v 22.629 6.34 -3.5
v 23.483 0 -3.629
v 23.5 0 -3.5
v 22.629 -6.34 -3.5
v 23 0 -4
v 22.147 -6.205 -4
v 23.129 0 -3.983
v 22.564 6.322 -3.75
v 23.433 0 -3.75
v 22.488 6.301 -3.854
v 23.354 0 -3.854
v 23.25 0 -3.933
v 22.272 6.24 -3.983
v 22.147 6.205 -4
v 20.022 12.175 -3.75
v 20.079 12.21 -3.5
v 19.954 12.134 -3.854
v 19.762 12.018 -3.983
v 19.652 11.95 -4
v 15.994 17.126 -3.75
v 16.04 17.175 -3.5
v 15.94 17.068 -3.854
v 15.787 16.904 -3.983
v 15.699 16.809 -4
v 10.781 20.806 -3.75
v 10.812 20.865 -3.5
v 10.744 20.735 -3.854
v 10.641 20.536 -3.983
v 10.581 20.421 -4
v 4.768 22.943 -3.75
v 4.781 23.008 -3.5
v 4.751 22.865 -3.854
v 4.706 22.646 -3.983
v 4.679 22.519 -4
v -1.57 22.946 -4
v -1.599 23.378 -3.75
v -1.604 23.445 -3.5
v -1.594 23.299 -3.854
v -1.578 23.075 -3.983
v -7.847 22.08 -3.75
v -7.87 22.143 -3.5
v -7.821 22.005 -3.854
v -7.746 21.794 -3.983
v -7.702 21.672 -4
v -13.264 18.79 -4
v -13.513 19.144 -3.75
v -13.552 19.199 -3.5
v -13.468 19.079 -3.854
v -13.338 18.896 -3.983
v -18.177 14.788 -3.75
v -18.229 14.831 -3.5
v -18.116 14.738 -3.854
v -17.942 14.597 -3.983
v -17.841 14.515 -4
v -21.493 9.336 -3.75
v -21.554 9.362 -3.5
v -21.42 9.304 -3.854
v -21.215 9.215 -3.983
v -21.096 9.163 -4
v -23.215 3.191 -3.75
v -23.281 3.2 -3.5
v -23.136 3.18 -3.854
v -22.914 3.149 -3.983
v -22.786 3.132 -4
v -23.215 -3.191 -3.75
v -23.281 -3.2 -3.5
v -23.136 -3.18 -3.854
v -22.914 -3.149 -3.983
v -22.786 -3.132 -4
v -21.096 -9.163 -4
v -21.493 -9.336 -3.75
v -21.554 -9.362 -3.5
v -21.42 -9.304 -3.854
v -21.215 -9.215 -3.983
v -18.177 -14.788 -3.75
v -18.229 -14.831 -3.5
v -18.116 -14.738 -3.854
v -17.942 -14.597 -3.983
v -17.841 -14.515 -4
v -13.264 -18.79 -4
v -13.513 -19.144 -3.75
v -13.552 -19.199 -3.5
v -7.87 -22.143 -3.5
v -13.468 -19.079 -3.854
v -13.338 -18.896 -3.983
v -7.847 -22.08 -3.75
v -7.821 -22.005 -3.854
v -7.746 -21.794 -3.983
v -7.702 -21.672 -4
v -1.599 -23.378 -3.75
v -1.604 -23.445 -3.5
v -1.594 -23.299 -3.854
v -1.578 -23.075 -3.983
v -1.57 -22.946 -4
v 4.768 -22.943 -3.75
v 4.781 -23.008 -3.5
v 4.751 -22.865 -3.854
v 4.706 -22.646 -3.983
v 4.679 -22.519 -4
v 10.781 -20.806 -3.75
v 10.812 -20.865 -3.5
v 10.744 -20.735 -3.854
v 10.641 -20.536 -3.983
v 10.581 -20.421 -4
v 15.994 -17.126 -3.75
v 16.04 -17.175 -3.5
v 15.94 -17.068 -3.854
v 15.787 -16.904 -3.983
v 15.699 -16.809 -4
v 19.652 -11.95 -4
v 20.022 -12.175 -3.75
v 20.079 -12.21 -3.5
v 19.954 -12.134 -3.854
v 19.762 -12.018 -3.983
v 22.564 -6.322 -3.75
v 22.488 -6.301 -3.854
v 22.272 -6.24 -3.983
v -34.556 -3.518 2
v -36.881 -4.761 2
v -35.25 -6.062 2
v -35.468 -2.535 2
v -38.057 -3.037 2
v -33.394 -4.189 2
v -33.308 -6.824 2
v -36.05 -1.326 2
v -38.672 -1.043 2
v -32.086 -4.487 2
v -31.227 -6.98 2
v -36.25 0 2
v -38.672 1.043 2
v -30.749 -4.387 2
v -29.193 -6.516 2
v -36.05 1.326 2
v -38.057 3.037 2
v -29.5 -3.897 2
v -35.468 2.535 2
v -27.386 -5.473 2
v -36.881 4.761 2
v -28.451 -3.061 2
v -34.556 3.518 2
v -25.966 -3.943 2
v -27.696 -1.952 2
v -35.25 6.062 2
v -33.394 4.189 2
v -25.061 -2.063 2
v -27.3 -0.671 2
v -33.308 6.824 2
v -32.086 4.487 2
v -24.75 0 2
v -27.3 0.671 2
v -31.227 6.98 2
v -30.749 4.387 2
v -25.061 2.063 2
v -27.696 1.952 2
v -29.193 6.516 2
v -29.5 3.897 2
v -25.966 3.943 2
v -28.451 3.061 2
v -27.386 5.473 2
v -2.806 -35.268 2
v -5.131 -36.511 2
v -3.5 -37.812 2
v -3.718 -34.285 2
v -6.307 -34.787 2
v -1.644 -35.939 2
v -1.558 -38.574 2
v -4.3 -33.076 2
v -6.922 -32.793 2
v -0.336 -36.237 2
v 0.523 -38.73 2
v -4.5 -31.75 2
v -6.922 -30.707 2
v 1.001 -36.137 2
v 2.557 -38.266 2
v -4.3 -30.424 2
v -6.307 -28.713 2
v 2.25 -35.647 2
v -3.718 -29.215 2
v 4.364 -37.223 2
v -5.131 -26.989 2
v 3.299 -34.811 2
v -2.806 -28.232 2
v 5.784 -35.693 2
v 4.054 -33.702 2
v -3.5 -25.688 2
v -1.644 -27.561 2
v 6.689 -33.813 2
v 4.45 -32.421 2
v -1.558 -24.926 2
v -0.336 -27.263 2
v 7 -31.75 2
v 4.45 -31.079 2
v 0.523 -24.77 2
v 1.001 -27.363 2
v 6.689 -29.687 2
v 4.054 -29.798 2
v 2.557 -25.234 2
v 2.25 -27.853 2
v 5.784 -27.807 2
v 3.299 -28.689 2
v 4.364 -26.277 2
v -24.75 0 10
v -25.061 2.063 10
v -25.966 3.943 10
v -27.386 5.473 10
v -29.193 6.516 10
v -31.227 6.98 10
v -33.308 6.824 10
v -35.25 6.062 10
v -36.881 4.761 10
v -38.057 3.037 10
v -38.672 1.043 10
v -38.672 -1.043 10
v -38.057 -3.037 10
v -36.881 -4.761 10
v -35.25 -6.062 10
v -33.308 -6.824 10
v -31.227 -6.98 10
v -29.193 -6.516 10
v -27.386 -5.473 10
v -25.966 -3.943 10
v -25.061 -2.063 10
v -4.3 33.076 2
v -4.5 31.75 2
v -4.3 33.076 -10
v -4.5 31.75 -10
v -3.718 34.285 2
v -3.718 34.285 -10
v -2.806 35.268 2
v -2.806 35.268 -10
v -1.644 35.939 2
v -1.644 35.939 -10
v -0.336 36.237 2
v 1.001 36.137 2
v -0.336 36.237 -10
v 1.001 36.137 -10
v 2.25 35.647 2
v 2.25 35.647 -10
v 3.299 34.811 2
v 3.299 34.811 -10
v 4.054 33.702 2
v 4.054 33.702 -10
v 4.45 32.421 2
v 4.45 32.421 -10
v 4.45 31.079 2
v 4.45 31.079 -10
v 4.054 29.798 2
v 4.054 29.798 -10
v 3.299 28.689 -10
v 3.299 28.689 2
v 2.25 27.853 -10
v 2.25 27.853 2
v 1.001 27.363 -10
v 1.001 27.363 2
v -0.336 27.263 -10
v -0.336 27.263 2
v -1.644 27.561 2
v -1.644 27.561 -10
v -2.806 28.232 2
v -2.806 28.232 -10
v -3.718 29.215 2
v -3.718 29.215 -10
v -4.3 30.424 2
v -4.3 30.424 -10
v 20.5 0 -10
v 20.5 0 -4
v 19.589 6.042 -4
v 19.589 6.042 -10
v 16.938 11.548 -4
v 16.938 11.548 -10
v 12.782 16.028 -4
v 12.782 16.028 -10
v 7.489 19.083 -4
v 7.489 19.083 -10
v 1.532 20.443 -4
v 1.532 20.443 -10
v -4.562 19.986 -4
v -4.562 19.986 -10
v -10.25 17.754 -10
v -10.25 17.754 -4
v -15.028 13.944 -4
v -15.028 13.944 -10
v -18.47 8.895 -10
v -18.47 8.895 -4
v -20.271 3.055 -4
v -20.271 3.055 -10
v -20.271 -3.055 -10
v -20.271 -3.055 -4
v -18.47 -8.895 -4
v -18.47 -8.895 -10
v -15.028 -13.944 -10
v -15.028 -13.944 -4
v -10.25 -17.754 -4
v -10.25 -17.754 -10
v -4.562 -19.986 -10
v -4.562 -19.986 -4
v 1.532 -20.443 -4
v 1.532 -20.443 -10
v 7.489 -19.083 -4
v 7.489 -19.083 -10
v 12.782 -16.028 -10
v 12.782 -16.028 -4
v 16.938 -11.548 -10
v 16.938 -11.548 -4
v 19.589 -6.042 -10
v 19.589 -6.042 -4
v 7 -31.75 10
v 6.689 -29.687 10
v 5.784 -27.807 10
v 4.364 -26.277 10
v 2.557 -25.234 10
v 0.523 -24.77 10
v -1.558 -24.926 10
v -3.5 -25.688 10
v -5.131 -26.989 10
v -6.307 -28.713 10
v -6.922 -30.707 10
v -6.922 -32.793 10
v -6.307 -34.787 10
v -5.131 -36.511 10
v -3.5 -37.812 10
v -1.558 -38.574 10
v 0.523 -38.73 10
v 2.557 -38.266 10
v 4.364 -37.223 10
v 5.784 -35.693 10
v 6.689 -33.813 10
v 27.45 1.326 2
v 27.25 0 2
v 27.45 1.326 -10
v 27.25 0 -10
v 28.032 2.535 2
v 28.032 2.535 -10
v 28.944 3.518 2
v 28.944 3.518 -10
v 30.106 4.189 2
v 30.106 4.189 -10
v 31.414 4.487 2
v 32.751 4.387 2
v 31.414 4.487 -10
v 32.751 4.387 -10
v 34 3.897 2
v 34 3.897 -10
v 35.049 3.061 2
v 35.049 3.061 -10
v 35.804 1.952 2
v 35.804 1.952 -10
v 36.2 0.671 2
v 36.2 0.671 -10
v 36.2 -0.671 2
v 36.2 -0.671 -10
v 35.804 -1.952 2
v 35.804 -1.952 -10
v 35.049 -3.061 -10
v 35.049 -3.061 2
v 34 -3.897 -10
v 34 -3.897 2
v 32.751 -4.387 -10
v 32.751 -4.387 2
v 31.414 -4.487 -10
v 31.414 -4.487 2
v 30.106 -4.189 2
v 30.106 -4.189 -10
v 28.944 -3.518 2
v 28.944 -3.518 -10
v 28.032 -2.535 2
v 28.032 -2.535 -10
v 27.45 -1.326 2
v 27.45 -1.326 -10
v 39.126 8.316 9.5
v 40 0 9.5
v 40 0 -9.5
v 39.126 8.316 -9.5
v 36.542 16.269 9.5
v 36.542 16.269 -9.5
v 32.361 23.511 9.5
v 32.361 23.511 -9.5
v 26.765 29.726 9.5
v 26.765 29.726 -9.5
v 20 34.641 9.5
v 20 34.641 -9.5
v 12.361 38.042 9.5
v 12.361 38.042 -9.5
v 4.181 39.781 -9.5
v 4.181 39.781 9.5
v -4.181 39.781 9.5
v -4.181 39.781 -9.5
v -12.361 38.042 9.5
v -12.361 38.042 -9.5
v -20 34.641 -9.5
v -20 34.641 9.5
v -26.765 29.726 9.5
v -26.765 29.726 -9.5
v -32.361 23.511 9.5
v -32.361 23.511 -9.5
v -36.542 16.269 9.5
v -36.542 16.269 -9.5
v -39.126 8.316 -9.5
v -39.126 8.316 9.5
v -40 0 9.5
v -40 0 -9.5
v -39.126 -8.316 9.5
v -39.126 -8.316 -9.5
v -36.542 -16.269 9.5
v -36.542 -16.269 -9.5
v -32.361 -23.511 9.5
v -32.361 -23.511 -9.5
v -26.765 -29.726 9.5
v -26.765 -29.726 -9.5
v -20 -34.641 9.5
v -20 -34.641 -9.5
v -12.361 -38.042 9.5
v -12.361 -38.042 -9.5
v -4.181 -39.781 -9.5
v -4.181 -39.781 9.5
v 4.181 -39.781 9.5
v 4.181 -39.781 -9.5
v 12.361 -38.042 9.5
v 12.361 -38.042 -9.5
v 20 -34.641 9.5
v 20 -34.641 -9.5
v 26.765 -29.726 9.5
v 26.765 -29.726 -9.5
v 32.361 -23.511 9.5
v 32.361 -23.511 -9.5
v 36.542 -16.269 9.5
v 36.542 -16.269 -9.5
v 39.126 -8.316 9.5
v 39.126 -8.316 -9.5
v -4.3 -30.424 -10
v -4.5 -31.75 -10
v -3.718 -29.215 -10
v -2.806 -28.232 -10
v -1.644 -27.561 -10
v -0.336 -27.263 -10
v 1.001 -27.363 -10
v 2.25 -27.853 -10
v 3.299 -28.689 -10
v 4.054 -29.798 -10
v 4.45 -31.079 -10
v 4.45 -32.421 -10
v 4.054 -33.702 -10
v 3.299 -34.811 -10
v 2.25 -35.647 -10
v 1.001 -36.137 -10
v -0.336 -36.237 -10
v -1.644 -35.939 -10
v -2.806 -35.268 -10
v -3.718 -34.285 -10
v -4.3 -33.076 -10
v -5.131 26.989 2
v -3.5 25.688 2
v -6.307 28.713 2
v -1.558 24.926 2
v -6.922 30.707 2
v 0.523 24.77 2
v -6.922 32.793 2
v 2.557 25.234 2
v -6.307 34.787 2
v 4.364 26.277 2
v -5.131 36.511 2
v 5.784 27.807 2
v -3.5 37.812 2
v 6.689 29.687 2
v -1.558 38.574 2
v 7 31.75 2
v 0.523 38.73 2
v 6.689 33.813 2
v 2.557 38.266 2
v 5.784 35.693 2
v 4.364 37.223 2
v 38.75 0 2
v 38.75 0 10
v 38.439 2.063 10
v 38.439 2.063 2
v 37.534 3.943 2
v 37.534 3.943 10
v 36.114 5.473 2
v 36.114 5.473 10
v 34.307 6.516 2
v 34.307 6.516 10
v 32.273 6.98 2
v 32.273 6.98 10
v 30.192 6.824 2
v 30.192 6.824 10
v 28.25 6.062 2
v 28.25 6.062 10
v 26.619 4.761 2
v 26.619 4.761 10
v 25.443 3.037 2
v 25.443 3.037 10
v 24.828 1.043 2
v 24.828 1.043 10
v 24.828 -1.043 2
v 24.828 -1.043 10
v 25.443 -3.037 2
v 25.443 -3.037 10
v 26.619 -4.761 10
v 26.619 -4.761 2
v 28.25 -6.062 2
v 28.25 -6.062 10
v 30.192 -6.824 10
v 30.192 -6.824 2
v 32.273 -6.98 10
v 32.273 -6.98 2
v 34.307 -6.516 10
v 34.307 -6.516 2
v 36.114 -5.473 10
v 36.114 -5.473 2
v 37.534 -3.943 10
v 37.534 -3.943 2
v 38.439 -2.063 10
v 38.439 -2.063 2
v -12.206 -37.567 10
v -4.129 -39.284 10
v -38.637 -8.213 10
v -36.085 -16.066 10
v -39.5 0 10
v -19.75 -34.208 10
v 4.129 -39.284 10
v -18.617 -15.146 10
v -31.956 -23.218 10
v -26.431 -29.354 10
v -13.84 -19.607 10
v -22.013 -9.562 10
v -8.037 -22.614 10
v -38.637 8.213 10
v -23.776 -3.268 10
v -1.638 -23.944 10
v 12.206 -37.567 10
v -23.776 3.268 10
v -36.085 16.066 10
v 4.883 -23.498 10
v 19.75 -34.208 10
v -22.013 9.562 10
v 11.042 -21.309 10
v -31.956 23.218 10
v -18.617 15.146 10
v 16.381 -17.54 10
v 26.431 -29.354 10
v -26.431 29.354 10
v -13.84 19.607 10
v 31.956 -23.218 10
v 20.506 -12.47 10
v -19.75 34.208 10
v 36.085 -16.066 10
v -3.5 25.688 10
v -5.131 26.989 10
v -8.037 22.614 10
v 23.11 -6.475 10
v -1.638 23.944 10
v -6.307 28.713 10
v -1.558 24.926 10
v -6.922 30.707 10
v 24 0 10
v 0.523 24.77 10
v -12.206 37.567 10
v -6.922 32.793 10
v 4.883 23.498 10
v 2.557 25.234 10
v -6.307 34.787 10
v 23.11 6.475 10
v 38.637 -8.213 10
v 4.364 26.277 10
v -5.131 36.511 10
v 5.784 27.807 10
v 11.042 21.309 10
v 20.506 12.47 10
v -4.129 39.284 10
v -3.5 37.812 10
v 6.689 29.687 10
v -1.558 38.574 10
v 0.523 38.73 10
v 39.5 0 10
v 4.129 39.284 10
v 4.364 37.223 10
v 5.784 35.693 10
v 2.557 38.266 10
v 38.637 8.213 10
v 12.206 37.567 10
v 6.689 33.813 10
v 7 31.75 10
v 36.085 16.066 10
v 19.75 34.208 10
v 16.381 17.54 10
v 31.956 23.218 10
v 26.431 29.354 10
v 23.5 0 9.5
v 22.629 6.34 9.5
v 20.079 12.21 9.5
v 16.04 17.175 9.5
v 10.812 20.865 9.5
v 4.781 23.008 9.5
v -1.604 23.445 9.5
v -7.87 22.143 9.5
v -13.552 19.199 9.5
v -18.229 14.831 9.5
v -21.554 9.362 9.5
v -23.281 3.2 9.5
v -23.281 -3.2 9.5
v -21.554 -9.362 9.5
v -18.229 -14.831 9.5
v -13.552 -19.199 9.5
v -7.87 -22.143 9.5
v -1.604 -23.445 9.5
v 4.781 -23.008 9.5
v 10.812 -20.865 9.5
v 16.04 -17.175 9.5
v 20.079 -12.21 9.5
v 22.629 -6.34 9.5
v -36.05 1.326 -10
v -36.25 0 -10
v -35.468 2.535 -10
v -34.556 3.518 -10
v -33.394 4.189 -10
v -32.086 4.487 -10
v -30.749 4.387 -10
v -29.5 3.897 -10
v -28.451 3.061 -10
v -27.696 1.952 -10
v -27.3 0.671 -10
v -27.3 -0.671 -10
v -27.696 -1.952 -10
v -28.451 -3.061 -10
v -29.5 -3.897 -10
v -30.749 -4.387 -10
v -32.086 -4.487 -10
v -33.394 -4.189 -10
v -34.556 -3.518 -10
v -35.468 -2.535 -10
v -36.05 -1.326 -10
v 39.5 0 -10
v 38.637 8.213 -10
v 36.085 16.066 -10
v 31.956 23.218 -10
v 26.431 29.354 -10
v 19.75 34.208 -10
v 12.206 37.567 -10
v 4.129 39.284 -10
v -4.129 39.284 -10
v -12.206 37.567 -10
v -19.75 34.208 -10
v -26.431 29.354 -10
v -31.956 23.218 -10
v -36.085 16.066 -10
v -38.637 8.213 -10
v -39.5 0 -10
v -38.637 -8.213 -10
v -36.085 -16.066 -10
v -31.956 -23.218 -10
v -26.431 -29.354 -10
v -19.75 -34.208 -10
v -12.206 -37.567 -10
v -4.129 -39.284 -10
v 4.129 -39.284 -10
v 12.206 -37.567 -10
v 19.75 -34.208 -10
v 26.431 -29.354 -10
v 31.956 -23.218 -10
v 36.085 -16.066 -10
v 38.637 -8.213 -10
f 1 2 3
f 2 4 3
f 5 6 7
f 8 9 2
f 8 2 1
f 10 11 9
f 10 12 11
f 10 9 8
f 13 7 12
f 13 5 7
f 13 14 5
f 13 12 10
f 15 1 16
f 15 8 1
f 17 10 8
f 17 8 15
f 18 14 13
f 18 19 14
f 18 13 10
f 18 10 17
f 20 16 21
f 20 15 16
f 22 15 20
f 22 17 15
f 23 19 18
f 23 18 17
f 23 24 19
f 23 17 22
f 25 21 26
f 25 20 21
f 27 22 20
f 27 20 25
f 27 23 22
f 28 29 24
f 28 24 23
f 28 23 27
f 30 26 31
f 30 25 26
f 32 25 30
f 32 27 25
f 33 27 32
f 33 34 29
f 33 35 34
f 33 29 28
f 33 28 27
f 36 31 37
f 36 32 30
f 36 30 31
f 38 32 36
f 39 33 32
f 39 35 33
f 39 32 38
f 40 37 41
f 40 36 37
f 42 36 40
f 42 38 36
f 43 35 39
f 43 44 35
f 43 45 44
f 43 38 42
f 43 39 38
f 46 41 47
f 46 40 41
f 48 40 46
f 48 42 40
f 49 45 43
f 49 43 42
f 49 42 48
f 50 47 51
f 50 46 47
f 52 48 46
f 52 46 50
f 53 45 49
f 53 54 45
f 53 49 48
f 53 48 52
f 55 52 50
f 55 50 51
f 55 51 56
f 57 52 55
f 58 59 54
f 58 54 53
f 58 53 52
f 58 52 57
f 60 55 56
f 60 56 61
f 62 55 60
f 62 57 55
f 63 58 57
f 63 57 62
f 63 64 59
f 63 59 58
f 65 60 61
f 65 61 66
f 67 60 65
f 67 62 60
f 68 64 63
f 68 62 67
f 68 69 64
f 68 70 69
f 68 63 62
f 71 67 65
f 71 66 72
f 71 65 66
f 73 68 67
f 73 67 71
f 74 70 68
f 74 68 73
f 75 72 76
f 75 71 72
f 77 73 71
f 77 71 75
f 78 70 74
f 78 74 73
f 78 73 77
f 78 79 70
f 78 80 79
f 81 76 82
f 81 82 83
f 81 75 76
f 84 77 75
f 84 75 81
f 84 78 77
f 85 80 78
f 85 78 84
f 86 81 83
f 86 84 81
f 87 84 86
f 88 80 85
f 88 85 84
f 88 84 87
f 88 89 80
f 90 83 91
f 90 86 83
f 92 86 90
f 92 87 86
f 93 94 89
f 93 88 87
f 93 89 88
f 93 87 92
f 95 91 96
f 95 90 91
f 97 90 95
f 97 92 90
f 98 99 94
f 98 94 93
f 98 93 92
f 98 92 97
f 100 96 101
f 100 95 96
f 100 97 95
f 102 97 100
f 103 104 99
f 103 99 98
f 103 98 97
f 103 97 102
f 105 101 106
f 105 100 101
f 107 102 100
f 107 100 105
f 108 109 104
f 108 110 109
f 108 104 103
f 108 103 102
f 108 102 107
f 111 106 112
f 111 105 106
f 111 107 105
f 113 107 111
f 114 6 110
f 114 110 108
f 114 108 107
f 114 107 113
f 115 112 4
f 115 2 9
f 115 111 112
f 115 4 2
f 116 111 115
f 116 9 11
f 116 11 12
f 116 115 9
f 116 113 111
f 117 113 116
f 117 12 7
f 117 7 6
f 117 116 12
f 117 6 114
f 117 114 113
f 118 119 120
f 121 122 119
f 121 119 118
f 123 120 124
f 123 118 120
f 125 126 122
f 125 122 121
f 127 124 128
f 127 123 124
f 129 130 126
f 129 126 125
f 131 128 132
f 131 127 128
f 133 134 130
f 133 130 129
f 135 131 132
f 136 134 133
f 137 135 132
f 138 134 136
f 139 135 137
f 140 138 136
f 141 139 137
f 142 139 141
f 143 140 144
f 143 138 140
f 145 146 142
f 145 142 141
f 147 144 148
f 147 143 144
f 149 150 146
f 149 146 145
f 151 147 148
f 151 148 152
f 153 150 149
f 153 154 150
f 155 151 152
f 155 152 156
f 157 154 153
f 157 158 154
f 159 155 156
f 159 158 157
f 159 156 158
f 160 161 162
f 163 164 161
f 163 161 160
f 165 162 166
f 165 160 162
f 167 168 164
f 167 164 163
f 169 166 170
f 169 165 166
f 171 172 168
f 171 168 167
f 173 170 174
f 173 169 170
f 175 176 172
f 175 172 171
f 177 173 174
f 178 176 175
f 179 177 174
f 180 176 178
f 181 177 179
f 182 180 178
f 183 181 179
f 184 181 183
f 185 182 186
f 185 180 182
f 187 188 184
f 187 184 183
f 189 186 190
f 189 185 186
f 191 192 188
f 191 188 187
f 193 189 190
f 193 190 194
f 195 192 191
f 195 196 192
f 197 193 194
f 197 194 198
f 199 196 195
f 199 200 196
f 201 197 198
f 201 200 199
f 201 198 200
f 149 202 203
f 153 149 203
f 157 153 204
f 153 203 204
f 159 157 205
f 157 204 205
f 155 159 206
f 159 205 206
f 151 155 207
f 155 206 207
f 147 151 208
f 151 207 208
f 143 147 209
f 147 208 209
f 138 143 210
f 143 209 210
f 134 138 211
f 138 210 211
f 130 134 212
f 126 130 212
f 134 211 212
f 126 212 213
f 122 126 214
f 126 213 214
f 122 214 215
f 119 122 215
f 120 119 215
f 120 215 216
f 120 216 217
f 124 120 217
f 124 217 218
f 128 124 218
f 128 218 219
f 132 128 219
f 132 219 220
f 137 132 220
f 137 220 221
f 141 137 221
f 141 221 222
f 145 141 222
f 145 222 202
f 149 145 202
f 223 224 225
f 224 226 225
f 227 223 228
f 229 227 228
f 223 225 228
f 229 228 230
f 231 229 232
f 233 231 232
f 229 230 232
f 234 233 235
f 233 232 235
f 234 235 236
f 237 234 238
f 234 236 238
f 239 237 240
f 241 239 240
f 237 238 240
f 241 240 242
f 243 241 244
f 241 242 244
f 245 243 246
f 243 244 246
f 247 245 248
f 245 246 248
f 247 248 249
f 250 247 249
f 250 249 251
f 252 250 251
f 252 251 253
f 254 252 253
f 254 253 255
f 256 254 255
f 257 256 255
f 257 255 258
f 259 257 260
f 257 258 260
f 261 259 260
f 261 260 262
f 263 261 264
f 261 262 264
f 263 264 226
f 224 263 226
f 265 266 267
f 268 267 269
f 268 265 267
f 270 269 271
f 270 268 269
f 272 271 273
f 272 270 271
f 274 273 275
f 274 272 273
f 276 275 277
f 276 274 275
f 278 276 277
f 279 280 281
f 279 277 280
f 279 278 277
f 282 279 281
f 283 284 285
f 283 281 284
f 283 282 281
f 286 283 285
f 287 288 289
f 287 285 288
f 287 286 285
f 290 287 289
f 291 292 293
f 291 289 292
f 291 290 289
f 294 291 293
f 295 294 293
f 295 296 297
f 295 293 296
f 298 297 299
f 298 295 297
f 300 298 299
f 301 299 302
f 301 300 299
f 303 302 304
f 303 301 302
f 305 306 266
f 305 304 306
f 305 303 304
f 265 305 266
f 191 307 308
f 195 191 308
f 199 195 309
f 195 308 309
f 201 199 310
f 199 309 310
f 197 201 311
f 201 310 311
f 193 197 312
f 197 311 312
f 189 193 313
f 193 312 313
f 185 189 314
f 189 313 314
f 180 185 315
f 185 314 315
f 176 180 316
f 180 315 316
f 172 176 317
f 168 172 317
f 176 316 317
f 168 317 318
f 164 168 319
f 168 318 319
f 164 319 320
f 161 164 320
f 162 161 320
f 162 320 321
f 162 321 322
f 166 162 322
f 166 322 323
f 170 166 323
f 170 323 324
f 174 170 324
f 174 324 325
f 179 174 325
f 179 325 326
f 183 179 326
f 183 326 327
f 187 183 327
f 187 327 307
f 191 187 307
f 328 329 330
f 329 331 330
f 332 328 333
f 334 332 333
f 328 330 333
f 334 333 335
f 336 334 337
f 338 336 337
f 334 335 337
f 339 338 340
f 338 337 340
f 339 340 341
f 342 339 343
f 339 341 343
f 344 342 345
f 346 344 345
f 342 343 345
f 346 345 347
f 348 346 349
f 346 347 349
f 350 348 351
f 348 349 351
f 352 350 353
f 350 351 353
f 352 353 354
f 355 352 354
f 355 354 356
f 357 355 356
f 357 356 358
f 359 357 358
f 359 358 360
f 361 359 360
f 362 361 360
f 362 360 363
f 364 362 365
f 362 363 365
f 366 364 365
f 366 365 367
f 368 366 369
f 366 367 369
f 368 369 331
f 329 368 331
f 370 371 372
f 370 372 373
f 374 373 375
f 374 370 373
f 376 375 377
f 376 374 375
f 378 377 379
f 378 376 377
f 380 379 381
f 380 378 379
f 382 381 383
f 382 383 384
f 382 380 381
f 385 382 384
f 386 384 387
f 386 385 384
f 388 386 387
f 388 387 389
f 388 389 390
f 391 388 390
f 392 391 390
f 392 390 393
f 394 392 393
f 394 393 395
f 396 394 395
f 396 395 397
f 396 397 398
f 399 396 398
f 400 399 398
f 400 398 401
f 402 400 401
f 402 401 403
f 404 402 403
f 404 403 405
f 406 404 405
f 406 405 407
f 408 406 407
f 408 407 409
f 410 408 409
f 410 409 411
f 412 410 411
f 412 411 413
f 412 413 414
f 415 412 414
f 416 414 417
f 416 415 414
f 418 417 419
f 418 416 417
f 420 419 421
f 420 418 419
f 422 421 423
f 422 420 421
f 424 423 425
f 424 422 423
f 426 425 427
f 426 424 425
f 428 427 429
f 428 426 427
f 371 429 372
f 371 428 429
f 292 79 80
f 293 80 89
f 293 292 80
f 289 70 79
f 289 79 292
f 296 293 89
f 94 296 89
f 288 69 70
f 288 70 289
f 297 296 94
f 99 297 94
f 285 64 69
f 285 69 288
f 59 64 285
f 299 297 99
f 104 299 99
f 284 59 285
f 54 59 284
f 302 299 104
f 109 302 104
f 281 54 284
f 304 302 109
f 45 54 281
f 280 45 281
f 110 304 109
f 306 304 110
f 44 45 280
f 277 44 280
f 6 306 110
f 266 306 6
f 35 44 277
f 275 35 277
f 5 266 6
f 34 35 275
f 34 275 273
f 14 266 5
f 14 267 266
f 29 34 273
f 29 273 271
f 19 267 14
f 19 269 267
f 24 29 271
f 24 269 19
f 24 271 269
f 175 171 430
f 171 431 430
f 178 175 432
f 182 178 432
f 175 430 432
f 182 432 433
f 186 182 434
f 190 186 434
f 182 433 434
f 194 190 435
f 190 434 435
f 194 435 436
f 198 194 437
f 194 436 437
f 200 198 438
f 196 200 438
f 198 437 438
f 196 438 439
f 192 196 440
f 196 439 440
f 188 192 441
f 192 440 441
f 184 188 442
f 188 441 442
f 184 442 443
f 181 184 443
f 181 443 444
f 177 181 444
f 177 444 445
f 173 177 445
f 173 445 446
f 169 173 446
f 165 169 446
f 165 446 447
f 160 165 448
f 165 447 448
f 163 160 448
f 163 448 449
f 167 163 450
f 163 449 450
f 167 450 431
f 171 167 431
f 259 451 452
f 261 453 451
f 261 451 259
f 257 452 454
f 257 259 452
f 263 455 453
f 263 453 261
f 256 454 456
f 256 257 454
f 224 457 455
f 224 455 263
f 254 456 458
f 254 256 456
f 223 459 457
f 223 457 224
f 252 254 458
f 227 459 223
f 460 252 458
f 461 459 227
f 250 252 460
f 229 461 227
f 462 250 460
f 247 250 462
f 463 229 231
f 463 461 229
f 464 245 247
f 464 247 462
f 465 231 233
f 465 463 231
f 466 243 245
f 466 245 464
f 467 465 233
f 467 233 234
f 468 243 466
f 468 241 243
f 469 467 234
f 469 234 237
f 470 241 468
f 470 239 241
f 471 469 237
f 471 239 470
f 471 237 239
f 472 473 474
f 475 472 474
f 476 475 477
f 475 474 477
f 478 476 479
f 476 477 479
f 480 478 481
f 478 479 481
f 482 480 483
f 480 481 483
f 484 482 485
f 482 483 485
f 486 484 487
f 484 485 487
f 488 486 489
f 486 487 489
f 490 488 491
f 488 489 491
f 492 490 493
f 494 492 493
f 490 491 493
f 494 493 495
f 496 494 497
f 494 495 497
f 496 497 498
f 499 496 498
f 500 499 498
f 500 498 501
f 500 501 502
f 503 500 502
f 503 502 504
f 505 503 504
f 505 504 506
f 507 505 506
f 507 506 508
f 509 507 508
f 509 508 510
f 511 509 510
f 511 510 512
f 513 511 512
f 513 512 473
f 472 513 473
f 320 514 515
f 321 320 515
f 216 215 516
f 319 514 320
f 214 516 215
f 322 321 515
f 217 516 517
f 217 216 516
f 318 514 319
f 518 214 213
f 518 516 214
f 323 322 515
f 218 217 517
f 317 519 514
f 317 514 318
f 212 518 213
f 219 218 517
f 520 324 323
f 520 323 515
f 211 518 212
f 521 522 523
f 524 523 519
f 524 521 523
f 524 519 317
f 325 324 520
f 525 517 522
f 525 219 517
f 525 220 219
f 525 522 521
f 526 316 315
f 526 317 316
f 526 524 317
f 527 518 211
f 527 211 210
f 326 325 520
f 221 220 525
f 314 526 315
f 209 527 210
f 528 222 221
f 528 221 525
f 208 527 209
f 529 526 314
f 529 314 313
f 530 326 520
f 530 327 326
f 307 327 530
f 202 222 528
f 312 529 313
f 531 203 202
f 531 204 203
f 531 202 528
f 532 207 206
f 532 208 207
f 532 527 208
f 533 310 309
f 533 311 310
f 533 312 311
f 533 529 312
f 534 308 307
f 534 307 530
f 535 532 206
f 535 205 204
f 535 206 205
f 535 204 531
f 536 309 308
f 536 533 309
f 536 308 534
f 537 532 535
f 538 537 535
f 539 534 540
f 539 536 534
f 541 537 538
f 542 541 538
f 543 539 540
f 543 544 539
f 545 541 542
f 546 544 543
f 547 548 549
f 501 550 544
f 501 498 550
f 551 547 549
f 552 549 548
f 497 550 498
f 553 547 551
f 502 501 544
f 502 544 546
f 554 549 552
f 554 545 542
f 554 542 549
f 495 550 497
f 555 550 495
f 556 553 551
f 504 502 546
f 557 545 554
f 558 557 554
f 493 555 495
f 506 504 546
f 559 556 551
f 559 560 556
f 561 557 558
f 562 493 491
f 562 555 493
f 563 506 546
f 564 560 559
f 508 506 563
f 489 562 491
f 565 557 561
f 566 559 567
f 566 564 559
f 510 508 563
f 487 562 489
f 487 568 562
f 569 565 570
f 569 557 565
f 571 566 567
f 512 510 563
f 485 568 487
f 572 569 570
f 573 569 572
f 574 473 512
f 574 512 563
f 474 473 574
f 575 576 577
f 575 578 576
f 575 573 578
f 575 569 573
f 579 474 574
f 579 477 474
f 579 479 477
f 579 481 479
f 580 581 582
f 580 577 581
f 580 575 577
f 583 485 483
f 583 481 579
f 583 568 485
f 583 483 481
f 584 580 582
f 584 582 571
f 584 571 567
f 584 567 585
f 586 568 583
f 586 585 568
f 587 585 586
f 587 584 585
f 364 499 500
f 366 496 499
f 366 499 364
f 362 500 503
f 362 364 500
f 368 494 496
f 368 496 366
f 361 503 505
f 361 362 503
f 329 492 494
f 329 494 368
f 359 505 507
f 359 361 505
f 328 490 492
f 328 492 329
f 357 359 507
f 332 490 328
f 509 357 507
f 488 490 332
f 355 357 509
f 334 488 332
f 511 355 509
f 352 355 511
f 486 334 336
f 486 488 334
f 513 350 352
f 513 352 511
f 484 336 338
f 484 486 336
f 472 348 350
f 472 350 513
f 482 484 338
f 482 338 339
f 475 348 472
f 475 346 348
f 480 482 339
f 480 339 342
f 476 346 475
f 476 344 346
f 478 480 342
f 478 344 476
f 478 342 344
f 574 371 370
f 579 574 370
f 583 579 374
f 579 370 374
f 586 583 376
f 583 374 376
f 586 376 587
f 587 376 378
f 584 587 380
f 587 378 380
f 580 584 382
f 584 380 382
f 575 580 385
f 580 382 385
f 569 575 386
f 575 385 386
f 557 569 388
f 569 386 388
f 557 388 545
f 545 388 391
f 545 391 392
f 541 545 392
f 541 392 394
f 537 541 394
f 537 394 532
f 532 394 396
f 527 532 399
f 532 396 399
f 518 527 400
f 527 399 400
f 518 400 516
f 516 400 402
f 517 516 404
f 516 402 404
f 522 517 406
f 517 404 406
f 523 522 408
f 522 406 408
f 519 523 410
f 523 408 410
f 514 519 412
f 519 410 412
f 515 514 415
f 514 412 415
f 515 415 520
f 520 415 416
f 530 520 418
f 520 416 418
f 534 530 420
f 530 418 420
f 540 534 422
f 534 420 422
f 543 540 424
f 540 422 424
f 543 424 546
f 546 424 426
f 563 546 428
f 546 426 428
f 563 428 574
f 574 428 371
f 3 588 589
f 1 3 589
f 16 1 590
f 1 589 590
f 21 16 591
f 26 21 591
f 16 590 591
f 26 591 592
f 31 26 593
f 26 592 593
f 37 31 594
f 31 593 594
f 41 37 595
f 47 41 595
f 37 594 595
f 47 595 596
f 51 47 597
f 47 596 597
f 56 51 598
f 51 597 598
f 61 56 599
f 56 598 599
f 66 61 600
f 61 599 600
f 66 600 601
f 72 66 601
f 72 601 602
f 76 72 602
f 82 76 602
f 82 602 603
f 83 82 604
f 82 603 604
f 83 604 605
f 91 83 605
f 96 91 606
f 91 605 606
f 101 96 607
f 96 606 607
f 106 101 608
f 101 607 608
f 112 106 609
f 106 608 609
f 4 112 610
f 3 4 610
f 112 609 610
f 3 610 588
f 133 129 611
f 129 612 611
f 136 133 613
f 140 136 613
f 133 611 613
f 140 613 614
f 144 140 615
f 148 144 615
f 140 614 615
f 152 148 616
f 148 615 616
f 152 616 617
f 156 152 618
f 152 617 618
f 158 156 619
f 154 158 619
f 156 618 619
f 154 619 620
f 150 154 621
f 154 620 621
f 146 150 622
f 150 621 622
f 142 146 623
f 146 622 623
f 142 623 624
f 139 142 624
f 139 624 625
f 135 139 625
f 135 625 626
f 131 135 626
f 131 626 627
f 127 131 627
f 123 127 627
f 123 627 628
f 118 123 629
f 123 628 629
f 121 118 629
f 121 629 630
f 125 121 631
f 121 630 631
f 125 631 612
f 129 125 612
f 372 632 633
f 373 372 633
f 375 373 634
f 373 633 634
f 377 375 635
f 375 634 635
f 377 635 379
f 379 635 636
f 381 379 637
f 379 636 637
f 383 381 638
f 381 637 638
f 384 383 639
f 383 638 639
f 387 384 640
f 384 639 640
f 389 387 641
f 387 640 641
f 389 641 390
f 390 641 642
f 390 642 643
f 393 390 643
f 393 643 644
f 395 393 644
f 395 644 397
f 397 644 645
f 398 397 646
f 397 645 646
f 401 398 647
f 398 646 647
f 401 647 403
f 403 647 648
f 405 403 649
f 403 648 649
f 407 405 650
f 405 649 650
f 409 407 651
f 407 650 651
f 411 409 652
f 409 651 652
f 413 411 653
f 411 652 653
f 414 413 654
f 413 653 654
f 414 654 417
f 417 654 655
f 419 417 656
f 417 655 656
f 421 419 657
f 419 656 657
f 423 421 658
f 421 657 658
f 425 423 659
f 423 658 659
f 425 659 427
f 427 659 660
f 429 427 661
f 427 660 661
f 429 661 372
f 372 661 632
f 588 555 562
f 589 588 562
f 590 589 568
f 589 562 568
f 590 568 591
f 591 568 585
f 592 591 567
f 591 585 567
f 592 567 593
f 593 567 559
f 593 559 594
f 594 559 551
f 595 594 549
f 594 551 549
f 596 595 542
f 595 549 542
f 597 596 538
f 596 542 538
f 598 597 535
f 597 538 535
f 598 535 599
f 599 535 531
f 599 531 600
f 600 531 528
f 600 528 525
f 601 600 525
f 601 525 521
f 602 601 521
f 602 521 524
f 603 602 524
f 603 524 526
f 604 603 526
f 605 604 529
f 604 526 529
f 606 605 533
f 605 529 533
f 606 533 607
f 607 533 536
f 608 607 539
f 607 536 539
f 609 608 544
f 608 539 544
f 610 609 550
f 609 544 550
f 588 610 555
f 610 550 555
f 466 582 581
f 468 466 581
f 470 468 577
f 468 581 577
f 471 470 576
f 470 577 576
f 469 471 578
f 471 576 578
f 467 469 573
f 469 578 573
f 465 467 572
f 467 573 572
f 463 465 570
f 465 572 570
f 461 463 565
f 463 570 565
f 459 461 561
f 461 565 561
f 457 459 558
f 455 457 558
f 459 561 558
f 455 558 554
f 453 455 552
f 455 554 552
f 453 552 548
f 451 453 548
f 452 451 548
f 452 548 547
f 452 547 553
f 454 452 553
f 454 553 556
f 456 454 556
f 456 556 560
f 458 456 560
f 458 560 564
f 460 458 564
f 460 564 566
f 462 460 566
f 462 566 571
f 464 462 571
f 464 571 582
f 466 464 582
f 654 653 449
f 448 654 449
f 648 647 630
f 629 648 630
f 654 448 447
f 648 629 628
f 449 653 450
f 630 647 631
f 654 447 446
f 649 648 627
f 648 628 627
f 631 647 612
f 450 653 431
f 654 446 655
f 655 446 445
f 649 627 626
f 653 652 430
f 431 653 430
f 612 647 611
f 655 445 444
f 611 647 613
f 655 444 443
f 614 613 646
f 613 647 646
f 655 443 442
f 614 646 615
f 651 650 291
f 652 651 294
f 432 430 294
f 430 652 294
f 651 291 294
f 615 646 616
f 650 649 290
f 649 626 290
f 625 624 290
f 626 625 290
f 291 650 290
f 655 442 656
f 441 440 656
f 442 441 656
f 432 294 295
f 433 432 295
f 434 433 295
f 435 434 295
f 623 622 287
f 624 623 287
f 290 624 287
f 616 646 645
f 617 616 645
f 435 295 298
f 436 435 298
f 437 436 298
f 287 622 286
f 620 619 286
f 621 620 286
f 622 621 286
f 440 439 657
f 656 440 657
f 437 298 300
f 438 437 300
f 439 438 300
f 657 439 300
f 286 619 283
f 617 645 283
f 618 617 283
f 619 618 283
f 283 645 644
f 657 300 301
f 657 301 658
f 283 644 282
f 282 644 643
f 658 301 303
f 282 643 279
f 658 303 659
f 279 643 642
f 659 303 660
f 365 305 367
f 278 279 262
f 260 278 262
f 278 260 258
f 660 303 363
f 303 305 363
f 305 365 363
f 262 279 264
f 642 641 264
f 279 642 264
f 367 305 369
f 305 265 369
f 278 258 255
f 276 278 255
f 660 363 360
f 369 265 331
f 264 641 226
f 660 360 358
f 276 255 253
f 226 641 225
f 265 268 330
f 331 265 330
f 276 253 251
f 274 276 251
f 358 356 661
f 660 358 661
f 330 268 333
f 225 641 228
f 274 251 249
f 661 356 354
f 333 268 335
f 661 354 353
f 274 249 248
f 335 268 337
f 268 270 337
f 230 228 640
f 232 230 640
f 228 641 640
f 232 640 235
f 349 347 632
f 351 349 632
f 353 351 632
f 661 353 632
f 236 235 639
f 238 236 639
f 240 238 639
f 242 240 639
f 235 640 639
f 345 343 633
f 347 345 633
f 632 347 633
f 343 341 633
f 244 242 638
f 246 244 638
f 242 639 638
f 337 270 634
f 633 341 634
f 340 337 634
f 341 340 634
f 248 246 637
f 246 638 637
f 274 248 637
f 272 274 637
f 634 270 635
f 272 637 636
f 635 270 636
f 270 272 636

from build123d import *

# Parameters (mm, degrees)
F0_R           = 40
F0_R_2         = 20.5
F1_DEPTH       = 10
F2_R           = 23.5
F3_DEPTH       = 14
F4_R           = 0.5
F5_SIZE        = 0.5
F7_D           = 9
F7_CBORE_D     = 14
F7_CBORE_DEPTH = 8


with BuildPart() as f1:
    # F0 (on Top) → F1 (new body, symmetric)
    with BuildSketch(Plane.XY):
        Circle(F0_R)
        Circle(F0_R_2, mode=Mode.SUBTRACT)
    extrude(amount=F1_DEPTH, both=True)

    # F2 (on face) → F3 (cut)
    with BuildSketch(Plane.XY.offset(10)):
        Circle(F2_R)
    extrude(amount=-F3_DEPTH, mode=Mode.SUBTRACT)

    # F4
    f4_edges = [f1.edges().sort_by_distance(p)[0] for p in [
        (-23.5, 0, -4),
    ]]
    fillet(f4_edges, radius=F4_R)

    # F5
    f5_edges = [f1.edges().sort_by_distance(p)[0] for p in [
        (-23.5, 0, 10),
        (-40, 0, 10),
        (-40, 0, -10),
    ]]
    chamfer(f5_edges, length=F5_SIZE)

    # F7 (through all)
    with Locations(Plane.XY.offset(10)):
        with Locations((0, 31.75), (0, -31.75), (31.75, 0), (-31.75, 0)):
            CounterBoreHole(F7_D / 2, F7_CBORE_D / 2, F7_CBORE_DEPTH)


solid = f1.part
